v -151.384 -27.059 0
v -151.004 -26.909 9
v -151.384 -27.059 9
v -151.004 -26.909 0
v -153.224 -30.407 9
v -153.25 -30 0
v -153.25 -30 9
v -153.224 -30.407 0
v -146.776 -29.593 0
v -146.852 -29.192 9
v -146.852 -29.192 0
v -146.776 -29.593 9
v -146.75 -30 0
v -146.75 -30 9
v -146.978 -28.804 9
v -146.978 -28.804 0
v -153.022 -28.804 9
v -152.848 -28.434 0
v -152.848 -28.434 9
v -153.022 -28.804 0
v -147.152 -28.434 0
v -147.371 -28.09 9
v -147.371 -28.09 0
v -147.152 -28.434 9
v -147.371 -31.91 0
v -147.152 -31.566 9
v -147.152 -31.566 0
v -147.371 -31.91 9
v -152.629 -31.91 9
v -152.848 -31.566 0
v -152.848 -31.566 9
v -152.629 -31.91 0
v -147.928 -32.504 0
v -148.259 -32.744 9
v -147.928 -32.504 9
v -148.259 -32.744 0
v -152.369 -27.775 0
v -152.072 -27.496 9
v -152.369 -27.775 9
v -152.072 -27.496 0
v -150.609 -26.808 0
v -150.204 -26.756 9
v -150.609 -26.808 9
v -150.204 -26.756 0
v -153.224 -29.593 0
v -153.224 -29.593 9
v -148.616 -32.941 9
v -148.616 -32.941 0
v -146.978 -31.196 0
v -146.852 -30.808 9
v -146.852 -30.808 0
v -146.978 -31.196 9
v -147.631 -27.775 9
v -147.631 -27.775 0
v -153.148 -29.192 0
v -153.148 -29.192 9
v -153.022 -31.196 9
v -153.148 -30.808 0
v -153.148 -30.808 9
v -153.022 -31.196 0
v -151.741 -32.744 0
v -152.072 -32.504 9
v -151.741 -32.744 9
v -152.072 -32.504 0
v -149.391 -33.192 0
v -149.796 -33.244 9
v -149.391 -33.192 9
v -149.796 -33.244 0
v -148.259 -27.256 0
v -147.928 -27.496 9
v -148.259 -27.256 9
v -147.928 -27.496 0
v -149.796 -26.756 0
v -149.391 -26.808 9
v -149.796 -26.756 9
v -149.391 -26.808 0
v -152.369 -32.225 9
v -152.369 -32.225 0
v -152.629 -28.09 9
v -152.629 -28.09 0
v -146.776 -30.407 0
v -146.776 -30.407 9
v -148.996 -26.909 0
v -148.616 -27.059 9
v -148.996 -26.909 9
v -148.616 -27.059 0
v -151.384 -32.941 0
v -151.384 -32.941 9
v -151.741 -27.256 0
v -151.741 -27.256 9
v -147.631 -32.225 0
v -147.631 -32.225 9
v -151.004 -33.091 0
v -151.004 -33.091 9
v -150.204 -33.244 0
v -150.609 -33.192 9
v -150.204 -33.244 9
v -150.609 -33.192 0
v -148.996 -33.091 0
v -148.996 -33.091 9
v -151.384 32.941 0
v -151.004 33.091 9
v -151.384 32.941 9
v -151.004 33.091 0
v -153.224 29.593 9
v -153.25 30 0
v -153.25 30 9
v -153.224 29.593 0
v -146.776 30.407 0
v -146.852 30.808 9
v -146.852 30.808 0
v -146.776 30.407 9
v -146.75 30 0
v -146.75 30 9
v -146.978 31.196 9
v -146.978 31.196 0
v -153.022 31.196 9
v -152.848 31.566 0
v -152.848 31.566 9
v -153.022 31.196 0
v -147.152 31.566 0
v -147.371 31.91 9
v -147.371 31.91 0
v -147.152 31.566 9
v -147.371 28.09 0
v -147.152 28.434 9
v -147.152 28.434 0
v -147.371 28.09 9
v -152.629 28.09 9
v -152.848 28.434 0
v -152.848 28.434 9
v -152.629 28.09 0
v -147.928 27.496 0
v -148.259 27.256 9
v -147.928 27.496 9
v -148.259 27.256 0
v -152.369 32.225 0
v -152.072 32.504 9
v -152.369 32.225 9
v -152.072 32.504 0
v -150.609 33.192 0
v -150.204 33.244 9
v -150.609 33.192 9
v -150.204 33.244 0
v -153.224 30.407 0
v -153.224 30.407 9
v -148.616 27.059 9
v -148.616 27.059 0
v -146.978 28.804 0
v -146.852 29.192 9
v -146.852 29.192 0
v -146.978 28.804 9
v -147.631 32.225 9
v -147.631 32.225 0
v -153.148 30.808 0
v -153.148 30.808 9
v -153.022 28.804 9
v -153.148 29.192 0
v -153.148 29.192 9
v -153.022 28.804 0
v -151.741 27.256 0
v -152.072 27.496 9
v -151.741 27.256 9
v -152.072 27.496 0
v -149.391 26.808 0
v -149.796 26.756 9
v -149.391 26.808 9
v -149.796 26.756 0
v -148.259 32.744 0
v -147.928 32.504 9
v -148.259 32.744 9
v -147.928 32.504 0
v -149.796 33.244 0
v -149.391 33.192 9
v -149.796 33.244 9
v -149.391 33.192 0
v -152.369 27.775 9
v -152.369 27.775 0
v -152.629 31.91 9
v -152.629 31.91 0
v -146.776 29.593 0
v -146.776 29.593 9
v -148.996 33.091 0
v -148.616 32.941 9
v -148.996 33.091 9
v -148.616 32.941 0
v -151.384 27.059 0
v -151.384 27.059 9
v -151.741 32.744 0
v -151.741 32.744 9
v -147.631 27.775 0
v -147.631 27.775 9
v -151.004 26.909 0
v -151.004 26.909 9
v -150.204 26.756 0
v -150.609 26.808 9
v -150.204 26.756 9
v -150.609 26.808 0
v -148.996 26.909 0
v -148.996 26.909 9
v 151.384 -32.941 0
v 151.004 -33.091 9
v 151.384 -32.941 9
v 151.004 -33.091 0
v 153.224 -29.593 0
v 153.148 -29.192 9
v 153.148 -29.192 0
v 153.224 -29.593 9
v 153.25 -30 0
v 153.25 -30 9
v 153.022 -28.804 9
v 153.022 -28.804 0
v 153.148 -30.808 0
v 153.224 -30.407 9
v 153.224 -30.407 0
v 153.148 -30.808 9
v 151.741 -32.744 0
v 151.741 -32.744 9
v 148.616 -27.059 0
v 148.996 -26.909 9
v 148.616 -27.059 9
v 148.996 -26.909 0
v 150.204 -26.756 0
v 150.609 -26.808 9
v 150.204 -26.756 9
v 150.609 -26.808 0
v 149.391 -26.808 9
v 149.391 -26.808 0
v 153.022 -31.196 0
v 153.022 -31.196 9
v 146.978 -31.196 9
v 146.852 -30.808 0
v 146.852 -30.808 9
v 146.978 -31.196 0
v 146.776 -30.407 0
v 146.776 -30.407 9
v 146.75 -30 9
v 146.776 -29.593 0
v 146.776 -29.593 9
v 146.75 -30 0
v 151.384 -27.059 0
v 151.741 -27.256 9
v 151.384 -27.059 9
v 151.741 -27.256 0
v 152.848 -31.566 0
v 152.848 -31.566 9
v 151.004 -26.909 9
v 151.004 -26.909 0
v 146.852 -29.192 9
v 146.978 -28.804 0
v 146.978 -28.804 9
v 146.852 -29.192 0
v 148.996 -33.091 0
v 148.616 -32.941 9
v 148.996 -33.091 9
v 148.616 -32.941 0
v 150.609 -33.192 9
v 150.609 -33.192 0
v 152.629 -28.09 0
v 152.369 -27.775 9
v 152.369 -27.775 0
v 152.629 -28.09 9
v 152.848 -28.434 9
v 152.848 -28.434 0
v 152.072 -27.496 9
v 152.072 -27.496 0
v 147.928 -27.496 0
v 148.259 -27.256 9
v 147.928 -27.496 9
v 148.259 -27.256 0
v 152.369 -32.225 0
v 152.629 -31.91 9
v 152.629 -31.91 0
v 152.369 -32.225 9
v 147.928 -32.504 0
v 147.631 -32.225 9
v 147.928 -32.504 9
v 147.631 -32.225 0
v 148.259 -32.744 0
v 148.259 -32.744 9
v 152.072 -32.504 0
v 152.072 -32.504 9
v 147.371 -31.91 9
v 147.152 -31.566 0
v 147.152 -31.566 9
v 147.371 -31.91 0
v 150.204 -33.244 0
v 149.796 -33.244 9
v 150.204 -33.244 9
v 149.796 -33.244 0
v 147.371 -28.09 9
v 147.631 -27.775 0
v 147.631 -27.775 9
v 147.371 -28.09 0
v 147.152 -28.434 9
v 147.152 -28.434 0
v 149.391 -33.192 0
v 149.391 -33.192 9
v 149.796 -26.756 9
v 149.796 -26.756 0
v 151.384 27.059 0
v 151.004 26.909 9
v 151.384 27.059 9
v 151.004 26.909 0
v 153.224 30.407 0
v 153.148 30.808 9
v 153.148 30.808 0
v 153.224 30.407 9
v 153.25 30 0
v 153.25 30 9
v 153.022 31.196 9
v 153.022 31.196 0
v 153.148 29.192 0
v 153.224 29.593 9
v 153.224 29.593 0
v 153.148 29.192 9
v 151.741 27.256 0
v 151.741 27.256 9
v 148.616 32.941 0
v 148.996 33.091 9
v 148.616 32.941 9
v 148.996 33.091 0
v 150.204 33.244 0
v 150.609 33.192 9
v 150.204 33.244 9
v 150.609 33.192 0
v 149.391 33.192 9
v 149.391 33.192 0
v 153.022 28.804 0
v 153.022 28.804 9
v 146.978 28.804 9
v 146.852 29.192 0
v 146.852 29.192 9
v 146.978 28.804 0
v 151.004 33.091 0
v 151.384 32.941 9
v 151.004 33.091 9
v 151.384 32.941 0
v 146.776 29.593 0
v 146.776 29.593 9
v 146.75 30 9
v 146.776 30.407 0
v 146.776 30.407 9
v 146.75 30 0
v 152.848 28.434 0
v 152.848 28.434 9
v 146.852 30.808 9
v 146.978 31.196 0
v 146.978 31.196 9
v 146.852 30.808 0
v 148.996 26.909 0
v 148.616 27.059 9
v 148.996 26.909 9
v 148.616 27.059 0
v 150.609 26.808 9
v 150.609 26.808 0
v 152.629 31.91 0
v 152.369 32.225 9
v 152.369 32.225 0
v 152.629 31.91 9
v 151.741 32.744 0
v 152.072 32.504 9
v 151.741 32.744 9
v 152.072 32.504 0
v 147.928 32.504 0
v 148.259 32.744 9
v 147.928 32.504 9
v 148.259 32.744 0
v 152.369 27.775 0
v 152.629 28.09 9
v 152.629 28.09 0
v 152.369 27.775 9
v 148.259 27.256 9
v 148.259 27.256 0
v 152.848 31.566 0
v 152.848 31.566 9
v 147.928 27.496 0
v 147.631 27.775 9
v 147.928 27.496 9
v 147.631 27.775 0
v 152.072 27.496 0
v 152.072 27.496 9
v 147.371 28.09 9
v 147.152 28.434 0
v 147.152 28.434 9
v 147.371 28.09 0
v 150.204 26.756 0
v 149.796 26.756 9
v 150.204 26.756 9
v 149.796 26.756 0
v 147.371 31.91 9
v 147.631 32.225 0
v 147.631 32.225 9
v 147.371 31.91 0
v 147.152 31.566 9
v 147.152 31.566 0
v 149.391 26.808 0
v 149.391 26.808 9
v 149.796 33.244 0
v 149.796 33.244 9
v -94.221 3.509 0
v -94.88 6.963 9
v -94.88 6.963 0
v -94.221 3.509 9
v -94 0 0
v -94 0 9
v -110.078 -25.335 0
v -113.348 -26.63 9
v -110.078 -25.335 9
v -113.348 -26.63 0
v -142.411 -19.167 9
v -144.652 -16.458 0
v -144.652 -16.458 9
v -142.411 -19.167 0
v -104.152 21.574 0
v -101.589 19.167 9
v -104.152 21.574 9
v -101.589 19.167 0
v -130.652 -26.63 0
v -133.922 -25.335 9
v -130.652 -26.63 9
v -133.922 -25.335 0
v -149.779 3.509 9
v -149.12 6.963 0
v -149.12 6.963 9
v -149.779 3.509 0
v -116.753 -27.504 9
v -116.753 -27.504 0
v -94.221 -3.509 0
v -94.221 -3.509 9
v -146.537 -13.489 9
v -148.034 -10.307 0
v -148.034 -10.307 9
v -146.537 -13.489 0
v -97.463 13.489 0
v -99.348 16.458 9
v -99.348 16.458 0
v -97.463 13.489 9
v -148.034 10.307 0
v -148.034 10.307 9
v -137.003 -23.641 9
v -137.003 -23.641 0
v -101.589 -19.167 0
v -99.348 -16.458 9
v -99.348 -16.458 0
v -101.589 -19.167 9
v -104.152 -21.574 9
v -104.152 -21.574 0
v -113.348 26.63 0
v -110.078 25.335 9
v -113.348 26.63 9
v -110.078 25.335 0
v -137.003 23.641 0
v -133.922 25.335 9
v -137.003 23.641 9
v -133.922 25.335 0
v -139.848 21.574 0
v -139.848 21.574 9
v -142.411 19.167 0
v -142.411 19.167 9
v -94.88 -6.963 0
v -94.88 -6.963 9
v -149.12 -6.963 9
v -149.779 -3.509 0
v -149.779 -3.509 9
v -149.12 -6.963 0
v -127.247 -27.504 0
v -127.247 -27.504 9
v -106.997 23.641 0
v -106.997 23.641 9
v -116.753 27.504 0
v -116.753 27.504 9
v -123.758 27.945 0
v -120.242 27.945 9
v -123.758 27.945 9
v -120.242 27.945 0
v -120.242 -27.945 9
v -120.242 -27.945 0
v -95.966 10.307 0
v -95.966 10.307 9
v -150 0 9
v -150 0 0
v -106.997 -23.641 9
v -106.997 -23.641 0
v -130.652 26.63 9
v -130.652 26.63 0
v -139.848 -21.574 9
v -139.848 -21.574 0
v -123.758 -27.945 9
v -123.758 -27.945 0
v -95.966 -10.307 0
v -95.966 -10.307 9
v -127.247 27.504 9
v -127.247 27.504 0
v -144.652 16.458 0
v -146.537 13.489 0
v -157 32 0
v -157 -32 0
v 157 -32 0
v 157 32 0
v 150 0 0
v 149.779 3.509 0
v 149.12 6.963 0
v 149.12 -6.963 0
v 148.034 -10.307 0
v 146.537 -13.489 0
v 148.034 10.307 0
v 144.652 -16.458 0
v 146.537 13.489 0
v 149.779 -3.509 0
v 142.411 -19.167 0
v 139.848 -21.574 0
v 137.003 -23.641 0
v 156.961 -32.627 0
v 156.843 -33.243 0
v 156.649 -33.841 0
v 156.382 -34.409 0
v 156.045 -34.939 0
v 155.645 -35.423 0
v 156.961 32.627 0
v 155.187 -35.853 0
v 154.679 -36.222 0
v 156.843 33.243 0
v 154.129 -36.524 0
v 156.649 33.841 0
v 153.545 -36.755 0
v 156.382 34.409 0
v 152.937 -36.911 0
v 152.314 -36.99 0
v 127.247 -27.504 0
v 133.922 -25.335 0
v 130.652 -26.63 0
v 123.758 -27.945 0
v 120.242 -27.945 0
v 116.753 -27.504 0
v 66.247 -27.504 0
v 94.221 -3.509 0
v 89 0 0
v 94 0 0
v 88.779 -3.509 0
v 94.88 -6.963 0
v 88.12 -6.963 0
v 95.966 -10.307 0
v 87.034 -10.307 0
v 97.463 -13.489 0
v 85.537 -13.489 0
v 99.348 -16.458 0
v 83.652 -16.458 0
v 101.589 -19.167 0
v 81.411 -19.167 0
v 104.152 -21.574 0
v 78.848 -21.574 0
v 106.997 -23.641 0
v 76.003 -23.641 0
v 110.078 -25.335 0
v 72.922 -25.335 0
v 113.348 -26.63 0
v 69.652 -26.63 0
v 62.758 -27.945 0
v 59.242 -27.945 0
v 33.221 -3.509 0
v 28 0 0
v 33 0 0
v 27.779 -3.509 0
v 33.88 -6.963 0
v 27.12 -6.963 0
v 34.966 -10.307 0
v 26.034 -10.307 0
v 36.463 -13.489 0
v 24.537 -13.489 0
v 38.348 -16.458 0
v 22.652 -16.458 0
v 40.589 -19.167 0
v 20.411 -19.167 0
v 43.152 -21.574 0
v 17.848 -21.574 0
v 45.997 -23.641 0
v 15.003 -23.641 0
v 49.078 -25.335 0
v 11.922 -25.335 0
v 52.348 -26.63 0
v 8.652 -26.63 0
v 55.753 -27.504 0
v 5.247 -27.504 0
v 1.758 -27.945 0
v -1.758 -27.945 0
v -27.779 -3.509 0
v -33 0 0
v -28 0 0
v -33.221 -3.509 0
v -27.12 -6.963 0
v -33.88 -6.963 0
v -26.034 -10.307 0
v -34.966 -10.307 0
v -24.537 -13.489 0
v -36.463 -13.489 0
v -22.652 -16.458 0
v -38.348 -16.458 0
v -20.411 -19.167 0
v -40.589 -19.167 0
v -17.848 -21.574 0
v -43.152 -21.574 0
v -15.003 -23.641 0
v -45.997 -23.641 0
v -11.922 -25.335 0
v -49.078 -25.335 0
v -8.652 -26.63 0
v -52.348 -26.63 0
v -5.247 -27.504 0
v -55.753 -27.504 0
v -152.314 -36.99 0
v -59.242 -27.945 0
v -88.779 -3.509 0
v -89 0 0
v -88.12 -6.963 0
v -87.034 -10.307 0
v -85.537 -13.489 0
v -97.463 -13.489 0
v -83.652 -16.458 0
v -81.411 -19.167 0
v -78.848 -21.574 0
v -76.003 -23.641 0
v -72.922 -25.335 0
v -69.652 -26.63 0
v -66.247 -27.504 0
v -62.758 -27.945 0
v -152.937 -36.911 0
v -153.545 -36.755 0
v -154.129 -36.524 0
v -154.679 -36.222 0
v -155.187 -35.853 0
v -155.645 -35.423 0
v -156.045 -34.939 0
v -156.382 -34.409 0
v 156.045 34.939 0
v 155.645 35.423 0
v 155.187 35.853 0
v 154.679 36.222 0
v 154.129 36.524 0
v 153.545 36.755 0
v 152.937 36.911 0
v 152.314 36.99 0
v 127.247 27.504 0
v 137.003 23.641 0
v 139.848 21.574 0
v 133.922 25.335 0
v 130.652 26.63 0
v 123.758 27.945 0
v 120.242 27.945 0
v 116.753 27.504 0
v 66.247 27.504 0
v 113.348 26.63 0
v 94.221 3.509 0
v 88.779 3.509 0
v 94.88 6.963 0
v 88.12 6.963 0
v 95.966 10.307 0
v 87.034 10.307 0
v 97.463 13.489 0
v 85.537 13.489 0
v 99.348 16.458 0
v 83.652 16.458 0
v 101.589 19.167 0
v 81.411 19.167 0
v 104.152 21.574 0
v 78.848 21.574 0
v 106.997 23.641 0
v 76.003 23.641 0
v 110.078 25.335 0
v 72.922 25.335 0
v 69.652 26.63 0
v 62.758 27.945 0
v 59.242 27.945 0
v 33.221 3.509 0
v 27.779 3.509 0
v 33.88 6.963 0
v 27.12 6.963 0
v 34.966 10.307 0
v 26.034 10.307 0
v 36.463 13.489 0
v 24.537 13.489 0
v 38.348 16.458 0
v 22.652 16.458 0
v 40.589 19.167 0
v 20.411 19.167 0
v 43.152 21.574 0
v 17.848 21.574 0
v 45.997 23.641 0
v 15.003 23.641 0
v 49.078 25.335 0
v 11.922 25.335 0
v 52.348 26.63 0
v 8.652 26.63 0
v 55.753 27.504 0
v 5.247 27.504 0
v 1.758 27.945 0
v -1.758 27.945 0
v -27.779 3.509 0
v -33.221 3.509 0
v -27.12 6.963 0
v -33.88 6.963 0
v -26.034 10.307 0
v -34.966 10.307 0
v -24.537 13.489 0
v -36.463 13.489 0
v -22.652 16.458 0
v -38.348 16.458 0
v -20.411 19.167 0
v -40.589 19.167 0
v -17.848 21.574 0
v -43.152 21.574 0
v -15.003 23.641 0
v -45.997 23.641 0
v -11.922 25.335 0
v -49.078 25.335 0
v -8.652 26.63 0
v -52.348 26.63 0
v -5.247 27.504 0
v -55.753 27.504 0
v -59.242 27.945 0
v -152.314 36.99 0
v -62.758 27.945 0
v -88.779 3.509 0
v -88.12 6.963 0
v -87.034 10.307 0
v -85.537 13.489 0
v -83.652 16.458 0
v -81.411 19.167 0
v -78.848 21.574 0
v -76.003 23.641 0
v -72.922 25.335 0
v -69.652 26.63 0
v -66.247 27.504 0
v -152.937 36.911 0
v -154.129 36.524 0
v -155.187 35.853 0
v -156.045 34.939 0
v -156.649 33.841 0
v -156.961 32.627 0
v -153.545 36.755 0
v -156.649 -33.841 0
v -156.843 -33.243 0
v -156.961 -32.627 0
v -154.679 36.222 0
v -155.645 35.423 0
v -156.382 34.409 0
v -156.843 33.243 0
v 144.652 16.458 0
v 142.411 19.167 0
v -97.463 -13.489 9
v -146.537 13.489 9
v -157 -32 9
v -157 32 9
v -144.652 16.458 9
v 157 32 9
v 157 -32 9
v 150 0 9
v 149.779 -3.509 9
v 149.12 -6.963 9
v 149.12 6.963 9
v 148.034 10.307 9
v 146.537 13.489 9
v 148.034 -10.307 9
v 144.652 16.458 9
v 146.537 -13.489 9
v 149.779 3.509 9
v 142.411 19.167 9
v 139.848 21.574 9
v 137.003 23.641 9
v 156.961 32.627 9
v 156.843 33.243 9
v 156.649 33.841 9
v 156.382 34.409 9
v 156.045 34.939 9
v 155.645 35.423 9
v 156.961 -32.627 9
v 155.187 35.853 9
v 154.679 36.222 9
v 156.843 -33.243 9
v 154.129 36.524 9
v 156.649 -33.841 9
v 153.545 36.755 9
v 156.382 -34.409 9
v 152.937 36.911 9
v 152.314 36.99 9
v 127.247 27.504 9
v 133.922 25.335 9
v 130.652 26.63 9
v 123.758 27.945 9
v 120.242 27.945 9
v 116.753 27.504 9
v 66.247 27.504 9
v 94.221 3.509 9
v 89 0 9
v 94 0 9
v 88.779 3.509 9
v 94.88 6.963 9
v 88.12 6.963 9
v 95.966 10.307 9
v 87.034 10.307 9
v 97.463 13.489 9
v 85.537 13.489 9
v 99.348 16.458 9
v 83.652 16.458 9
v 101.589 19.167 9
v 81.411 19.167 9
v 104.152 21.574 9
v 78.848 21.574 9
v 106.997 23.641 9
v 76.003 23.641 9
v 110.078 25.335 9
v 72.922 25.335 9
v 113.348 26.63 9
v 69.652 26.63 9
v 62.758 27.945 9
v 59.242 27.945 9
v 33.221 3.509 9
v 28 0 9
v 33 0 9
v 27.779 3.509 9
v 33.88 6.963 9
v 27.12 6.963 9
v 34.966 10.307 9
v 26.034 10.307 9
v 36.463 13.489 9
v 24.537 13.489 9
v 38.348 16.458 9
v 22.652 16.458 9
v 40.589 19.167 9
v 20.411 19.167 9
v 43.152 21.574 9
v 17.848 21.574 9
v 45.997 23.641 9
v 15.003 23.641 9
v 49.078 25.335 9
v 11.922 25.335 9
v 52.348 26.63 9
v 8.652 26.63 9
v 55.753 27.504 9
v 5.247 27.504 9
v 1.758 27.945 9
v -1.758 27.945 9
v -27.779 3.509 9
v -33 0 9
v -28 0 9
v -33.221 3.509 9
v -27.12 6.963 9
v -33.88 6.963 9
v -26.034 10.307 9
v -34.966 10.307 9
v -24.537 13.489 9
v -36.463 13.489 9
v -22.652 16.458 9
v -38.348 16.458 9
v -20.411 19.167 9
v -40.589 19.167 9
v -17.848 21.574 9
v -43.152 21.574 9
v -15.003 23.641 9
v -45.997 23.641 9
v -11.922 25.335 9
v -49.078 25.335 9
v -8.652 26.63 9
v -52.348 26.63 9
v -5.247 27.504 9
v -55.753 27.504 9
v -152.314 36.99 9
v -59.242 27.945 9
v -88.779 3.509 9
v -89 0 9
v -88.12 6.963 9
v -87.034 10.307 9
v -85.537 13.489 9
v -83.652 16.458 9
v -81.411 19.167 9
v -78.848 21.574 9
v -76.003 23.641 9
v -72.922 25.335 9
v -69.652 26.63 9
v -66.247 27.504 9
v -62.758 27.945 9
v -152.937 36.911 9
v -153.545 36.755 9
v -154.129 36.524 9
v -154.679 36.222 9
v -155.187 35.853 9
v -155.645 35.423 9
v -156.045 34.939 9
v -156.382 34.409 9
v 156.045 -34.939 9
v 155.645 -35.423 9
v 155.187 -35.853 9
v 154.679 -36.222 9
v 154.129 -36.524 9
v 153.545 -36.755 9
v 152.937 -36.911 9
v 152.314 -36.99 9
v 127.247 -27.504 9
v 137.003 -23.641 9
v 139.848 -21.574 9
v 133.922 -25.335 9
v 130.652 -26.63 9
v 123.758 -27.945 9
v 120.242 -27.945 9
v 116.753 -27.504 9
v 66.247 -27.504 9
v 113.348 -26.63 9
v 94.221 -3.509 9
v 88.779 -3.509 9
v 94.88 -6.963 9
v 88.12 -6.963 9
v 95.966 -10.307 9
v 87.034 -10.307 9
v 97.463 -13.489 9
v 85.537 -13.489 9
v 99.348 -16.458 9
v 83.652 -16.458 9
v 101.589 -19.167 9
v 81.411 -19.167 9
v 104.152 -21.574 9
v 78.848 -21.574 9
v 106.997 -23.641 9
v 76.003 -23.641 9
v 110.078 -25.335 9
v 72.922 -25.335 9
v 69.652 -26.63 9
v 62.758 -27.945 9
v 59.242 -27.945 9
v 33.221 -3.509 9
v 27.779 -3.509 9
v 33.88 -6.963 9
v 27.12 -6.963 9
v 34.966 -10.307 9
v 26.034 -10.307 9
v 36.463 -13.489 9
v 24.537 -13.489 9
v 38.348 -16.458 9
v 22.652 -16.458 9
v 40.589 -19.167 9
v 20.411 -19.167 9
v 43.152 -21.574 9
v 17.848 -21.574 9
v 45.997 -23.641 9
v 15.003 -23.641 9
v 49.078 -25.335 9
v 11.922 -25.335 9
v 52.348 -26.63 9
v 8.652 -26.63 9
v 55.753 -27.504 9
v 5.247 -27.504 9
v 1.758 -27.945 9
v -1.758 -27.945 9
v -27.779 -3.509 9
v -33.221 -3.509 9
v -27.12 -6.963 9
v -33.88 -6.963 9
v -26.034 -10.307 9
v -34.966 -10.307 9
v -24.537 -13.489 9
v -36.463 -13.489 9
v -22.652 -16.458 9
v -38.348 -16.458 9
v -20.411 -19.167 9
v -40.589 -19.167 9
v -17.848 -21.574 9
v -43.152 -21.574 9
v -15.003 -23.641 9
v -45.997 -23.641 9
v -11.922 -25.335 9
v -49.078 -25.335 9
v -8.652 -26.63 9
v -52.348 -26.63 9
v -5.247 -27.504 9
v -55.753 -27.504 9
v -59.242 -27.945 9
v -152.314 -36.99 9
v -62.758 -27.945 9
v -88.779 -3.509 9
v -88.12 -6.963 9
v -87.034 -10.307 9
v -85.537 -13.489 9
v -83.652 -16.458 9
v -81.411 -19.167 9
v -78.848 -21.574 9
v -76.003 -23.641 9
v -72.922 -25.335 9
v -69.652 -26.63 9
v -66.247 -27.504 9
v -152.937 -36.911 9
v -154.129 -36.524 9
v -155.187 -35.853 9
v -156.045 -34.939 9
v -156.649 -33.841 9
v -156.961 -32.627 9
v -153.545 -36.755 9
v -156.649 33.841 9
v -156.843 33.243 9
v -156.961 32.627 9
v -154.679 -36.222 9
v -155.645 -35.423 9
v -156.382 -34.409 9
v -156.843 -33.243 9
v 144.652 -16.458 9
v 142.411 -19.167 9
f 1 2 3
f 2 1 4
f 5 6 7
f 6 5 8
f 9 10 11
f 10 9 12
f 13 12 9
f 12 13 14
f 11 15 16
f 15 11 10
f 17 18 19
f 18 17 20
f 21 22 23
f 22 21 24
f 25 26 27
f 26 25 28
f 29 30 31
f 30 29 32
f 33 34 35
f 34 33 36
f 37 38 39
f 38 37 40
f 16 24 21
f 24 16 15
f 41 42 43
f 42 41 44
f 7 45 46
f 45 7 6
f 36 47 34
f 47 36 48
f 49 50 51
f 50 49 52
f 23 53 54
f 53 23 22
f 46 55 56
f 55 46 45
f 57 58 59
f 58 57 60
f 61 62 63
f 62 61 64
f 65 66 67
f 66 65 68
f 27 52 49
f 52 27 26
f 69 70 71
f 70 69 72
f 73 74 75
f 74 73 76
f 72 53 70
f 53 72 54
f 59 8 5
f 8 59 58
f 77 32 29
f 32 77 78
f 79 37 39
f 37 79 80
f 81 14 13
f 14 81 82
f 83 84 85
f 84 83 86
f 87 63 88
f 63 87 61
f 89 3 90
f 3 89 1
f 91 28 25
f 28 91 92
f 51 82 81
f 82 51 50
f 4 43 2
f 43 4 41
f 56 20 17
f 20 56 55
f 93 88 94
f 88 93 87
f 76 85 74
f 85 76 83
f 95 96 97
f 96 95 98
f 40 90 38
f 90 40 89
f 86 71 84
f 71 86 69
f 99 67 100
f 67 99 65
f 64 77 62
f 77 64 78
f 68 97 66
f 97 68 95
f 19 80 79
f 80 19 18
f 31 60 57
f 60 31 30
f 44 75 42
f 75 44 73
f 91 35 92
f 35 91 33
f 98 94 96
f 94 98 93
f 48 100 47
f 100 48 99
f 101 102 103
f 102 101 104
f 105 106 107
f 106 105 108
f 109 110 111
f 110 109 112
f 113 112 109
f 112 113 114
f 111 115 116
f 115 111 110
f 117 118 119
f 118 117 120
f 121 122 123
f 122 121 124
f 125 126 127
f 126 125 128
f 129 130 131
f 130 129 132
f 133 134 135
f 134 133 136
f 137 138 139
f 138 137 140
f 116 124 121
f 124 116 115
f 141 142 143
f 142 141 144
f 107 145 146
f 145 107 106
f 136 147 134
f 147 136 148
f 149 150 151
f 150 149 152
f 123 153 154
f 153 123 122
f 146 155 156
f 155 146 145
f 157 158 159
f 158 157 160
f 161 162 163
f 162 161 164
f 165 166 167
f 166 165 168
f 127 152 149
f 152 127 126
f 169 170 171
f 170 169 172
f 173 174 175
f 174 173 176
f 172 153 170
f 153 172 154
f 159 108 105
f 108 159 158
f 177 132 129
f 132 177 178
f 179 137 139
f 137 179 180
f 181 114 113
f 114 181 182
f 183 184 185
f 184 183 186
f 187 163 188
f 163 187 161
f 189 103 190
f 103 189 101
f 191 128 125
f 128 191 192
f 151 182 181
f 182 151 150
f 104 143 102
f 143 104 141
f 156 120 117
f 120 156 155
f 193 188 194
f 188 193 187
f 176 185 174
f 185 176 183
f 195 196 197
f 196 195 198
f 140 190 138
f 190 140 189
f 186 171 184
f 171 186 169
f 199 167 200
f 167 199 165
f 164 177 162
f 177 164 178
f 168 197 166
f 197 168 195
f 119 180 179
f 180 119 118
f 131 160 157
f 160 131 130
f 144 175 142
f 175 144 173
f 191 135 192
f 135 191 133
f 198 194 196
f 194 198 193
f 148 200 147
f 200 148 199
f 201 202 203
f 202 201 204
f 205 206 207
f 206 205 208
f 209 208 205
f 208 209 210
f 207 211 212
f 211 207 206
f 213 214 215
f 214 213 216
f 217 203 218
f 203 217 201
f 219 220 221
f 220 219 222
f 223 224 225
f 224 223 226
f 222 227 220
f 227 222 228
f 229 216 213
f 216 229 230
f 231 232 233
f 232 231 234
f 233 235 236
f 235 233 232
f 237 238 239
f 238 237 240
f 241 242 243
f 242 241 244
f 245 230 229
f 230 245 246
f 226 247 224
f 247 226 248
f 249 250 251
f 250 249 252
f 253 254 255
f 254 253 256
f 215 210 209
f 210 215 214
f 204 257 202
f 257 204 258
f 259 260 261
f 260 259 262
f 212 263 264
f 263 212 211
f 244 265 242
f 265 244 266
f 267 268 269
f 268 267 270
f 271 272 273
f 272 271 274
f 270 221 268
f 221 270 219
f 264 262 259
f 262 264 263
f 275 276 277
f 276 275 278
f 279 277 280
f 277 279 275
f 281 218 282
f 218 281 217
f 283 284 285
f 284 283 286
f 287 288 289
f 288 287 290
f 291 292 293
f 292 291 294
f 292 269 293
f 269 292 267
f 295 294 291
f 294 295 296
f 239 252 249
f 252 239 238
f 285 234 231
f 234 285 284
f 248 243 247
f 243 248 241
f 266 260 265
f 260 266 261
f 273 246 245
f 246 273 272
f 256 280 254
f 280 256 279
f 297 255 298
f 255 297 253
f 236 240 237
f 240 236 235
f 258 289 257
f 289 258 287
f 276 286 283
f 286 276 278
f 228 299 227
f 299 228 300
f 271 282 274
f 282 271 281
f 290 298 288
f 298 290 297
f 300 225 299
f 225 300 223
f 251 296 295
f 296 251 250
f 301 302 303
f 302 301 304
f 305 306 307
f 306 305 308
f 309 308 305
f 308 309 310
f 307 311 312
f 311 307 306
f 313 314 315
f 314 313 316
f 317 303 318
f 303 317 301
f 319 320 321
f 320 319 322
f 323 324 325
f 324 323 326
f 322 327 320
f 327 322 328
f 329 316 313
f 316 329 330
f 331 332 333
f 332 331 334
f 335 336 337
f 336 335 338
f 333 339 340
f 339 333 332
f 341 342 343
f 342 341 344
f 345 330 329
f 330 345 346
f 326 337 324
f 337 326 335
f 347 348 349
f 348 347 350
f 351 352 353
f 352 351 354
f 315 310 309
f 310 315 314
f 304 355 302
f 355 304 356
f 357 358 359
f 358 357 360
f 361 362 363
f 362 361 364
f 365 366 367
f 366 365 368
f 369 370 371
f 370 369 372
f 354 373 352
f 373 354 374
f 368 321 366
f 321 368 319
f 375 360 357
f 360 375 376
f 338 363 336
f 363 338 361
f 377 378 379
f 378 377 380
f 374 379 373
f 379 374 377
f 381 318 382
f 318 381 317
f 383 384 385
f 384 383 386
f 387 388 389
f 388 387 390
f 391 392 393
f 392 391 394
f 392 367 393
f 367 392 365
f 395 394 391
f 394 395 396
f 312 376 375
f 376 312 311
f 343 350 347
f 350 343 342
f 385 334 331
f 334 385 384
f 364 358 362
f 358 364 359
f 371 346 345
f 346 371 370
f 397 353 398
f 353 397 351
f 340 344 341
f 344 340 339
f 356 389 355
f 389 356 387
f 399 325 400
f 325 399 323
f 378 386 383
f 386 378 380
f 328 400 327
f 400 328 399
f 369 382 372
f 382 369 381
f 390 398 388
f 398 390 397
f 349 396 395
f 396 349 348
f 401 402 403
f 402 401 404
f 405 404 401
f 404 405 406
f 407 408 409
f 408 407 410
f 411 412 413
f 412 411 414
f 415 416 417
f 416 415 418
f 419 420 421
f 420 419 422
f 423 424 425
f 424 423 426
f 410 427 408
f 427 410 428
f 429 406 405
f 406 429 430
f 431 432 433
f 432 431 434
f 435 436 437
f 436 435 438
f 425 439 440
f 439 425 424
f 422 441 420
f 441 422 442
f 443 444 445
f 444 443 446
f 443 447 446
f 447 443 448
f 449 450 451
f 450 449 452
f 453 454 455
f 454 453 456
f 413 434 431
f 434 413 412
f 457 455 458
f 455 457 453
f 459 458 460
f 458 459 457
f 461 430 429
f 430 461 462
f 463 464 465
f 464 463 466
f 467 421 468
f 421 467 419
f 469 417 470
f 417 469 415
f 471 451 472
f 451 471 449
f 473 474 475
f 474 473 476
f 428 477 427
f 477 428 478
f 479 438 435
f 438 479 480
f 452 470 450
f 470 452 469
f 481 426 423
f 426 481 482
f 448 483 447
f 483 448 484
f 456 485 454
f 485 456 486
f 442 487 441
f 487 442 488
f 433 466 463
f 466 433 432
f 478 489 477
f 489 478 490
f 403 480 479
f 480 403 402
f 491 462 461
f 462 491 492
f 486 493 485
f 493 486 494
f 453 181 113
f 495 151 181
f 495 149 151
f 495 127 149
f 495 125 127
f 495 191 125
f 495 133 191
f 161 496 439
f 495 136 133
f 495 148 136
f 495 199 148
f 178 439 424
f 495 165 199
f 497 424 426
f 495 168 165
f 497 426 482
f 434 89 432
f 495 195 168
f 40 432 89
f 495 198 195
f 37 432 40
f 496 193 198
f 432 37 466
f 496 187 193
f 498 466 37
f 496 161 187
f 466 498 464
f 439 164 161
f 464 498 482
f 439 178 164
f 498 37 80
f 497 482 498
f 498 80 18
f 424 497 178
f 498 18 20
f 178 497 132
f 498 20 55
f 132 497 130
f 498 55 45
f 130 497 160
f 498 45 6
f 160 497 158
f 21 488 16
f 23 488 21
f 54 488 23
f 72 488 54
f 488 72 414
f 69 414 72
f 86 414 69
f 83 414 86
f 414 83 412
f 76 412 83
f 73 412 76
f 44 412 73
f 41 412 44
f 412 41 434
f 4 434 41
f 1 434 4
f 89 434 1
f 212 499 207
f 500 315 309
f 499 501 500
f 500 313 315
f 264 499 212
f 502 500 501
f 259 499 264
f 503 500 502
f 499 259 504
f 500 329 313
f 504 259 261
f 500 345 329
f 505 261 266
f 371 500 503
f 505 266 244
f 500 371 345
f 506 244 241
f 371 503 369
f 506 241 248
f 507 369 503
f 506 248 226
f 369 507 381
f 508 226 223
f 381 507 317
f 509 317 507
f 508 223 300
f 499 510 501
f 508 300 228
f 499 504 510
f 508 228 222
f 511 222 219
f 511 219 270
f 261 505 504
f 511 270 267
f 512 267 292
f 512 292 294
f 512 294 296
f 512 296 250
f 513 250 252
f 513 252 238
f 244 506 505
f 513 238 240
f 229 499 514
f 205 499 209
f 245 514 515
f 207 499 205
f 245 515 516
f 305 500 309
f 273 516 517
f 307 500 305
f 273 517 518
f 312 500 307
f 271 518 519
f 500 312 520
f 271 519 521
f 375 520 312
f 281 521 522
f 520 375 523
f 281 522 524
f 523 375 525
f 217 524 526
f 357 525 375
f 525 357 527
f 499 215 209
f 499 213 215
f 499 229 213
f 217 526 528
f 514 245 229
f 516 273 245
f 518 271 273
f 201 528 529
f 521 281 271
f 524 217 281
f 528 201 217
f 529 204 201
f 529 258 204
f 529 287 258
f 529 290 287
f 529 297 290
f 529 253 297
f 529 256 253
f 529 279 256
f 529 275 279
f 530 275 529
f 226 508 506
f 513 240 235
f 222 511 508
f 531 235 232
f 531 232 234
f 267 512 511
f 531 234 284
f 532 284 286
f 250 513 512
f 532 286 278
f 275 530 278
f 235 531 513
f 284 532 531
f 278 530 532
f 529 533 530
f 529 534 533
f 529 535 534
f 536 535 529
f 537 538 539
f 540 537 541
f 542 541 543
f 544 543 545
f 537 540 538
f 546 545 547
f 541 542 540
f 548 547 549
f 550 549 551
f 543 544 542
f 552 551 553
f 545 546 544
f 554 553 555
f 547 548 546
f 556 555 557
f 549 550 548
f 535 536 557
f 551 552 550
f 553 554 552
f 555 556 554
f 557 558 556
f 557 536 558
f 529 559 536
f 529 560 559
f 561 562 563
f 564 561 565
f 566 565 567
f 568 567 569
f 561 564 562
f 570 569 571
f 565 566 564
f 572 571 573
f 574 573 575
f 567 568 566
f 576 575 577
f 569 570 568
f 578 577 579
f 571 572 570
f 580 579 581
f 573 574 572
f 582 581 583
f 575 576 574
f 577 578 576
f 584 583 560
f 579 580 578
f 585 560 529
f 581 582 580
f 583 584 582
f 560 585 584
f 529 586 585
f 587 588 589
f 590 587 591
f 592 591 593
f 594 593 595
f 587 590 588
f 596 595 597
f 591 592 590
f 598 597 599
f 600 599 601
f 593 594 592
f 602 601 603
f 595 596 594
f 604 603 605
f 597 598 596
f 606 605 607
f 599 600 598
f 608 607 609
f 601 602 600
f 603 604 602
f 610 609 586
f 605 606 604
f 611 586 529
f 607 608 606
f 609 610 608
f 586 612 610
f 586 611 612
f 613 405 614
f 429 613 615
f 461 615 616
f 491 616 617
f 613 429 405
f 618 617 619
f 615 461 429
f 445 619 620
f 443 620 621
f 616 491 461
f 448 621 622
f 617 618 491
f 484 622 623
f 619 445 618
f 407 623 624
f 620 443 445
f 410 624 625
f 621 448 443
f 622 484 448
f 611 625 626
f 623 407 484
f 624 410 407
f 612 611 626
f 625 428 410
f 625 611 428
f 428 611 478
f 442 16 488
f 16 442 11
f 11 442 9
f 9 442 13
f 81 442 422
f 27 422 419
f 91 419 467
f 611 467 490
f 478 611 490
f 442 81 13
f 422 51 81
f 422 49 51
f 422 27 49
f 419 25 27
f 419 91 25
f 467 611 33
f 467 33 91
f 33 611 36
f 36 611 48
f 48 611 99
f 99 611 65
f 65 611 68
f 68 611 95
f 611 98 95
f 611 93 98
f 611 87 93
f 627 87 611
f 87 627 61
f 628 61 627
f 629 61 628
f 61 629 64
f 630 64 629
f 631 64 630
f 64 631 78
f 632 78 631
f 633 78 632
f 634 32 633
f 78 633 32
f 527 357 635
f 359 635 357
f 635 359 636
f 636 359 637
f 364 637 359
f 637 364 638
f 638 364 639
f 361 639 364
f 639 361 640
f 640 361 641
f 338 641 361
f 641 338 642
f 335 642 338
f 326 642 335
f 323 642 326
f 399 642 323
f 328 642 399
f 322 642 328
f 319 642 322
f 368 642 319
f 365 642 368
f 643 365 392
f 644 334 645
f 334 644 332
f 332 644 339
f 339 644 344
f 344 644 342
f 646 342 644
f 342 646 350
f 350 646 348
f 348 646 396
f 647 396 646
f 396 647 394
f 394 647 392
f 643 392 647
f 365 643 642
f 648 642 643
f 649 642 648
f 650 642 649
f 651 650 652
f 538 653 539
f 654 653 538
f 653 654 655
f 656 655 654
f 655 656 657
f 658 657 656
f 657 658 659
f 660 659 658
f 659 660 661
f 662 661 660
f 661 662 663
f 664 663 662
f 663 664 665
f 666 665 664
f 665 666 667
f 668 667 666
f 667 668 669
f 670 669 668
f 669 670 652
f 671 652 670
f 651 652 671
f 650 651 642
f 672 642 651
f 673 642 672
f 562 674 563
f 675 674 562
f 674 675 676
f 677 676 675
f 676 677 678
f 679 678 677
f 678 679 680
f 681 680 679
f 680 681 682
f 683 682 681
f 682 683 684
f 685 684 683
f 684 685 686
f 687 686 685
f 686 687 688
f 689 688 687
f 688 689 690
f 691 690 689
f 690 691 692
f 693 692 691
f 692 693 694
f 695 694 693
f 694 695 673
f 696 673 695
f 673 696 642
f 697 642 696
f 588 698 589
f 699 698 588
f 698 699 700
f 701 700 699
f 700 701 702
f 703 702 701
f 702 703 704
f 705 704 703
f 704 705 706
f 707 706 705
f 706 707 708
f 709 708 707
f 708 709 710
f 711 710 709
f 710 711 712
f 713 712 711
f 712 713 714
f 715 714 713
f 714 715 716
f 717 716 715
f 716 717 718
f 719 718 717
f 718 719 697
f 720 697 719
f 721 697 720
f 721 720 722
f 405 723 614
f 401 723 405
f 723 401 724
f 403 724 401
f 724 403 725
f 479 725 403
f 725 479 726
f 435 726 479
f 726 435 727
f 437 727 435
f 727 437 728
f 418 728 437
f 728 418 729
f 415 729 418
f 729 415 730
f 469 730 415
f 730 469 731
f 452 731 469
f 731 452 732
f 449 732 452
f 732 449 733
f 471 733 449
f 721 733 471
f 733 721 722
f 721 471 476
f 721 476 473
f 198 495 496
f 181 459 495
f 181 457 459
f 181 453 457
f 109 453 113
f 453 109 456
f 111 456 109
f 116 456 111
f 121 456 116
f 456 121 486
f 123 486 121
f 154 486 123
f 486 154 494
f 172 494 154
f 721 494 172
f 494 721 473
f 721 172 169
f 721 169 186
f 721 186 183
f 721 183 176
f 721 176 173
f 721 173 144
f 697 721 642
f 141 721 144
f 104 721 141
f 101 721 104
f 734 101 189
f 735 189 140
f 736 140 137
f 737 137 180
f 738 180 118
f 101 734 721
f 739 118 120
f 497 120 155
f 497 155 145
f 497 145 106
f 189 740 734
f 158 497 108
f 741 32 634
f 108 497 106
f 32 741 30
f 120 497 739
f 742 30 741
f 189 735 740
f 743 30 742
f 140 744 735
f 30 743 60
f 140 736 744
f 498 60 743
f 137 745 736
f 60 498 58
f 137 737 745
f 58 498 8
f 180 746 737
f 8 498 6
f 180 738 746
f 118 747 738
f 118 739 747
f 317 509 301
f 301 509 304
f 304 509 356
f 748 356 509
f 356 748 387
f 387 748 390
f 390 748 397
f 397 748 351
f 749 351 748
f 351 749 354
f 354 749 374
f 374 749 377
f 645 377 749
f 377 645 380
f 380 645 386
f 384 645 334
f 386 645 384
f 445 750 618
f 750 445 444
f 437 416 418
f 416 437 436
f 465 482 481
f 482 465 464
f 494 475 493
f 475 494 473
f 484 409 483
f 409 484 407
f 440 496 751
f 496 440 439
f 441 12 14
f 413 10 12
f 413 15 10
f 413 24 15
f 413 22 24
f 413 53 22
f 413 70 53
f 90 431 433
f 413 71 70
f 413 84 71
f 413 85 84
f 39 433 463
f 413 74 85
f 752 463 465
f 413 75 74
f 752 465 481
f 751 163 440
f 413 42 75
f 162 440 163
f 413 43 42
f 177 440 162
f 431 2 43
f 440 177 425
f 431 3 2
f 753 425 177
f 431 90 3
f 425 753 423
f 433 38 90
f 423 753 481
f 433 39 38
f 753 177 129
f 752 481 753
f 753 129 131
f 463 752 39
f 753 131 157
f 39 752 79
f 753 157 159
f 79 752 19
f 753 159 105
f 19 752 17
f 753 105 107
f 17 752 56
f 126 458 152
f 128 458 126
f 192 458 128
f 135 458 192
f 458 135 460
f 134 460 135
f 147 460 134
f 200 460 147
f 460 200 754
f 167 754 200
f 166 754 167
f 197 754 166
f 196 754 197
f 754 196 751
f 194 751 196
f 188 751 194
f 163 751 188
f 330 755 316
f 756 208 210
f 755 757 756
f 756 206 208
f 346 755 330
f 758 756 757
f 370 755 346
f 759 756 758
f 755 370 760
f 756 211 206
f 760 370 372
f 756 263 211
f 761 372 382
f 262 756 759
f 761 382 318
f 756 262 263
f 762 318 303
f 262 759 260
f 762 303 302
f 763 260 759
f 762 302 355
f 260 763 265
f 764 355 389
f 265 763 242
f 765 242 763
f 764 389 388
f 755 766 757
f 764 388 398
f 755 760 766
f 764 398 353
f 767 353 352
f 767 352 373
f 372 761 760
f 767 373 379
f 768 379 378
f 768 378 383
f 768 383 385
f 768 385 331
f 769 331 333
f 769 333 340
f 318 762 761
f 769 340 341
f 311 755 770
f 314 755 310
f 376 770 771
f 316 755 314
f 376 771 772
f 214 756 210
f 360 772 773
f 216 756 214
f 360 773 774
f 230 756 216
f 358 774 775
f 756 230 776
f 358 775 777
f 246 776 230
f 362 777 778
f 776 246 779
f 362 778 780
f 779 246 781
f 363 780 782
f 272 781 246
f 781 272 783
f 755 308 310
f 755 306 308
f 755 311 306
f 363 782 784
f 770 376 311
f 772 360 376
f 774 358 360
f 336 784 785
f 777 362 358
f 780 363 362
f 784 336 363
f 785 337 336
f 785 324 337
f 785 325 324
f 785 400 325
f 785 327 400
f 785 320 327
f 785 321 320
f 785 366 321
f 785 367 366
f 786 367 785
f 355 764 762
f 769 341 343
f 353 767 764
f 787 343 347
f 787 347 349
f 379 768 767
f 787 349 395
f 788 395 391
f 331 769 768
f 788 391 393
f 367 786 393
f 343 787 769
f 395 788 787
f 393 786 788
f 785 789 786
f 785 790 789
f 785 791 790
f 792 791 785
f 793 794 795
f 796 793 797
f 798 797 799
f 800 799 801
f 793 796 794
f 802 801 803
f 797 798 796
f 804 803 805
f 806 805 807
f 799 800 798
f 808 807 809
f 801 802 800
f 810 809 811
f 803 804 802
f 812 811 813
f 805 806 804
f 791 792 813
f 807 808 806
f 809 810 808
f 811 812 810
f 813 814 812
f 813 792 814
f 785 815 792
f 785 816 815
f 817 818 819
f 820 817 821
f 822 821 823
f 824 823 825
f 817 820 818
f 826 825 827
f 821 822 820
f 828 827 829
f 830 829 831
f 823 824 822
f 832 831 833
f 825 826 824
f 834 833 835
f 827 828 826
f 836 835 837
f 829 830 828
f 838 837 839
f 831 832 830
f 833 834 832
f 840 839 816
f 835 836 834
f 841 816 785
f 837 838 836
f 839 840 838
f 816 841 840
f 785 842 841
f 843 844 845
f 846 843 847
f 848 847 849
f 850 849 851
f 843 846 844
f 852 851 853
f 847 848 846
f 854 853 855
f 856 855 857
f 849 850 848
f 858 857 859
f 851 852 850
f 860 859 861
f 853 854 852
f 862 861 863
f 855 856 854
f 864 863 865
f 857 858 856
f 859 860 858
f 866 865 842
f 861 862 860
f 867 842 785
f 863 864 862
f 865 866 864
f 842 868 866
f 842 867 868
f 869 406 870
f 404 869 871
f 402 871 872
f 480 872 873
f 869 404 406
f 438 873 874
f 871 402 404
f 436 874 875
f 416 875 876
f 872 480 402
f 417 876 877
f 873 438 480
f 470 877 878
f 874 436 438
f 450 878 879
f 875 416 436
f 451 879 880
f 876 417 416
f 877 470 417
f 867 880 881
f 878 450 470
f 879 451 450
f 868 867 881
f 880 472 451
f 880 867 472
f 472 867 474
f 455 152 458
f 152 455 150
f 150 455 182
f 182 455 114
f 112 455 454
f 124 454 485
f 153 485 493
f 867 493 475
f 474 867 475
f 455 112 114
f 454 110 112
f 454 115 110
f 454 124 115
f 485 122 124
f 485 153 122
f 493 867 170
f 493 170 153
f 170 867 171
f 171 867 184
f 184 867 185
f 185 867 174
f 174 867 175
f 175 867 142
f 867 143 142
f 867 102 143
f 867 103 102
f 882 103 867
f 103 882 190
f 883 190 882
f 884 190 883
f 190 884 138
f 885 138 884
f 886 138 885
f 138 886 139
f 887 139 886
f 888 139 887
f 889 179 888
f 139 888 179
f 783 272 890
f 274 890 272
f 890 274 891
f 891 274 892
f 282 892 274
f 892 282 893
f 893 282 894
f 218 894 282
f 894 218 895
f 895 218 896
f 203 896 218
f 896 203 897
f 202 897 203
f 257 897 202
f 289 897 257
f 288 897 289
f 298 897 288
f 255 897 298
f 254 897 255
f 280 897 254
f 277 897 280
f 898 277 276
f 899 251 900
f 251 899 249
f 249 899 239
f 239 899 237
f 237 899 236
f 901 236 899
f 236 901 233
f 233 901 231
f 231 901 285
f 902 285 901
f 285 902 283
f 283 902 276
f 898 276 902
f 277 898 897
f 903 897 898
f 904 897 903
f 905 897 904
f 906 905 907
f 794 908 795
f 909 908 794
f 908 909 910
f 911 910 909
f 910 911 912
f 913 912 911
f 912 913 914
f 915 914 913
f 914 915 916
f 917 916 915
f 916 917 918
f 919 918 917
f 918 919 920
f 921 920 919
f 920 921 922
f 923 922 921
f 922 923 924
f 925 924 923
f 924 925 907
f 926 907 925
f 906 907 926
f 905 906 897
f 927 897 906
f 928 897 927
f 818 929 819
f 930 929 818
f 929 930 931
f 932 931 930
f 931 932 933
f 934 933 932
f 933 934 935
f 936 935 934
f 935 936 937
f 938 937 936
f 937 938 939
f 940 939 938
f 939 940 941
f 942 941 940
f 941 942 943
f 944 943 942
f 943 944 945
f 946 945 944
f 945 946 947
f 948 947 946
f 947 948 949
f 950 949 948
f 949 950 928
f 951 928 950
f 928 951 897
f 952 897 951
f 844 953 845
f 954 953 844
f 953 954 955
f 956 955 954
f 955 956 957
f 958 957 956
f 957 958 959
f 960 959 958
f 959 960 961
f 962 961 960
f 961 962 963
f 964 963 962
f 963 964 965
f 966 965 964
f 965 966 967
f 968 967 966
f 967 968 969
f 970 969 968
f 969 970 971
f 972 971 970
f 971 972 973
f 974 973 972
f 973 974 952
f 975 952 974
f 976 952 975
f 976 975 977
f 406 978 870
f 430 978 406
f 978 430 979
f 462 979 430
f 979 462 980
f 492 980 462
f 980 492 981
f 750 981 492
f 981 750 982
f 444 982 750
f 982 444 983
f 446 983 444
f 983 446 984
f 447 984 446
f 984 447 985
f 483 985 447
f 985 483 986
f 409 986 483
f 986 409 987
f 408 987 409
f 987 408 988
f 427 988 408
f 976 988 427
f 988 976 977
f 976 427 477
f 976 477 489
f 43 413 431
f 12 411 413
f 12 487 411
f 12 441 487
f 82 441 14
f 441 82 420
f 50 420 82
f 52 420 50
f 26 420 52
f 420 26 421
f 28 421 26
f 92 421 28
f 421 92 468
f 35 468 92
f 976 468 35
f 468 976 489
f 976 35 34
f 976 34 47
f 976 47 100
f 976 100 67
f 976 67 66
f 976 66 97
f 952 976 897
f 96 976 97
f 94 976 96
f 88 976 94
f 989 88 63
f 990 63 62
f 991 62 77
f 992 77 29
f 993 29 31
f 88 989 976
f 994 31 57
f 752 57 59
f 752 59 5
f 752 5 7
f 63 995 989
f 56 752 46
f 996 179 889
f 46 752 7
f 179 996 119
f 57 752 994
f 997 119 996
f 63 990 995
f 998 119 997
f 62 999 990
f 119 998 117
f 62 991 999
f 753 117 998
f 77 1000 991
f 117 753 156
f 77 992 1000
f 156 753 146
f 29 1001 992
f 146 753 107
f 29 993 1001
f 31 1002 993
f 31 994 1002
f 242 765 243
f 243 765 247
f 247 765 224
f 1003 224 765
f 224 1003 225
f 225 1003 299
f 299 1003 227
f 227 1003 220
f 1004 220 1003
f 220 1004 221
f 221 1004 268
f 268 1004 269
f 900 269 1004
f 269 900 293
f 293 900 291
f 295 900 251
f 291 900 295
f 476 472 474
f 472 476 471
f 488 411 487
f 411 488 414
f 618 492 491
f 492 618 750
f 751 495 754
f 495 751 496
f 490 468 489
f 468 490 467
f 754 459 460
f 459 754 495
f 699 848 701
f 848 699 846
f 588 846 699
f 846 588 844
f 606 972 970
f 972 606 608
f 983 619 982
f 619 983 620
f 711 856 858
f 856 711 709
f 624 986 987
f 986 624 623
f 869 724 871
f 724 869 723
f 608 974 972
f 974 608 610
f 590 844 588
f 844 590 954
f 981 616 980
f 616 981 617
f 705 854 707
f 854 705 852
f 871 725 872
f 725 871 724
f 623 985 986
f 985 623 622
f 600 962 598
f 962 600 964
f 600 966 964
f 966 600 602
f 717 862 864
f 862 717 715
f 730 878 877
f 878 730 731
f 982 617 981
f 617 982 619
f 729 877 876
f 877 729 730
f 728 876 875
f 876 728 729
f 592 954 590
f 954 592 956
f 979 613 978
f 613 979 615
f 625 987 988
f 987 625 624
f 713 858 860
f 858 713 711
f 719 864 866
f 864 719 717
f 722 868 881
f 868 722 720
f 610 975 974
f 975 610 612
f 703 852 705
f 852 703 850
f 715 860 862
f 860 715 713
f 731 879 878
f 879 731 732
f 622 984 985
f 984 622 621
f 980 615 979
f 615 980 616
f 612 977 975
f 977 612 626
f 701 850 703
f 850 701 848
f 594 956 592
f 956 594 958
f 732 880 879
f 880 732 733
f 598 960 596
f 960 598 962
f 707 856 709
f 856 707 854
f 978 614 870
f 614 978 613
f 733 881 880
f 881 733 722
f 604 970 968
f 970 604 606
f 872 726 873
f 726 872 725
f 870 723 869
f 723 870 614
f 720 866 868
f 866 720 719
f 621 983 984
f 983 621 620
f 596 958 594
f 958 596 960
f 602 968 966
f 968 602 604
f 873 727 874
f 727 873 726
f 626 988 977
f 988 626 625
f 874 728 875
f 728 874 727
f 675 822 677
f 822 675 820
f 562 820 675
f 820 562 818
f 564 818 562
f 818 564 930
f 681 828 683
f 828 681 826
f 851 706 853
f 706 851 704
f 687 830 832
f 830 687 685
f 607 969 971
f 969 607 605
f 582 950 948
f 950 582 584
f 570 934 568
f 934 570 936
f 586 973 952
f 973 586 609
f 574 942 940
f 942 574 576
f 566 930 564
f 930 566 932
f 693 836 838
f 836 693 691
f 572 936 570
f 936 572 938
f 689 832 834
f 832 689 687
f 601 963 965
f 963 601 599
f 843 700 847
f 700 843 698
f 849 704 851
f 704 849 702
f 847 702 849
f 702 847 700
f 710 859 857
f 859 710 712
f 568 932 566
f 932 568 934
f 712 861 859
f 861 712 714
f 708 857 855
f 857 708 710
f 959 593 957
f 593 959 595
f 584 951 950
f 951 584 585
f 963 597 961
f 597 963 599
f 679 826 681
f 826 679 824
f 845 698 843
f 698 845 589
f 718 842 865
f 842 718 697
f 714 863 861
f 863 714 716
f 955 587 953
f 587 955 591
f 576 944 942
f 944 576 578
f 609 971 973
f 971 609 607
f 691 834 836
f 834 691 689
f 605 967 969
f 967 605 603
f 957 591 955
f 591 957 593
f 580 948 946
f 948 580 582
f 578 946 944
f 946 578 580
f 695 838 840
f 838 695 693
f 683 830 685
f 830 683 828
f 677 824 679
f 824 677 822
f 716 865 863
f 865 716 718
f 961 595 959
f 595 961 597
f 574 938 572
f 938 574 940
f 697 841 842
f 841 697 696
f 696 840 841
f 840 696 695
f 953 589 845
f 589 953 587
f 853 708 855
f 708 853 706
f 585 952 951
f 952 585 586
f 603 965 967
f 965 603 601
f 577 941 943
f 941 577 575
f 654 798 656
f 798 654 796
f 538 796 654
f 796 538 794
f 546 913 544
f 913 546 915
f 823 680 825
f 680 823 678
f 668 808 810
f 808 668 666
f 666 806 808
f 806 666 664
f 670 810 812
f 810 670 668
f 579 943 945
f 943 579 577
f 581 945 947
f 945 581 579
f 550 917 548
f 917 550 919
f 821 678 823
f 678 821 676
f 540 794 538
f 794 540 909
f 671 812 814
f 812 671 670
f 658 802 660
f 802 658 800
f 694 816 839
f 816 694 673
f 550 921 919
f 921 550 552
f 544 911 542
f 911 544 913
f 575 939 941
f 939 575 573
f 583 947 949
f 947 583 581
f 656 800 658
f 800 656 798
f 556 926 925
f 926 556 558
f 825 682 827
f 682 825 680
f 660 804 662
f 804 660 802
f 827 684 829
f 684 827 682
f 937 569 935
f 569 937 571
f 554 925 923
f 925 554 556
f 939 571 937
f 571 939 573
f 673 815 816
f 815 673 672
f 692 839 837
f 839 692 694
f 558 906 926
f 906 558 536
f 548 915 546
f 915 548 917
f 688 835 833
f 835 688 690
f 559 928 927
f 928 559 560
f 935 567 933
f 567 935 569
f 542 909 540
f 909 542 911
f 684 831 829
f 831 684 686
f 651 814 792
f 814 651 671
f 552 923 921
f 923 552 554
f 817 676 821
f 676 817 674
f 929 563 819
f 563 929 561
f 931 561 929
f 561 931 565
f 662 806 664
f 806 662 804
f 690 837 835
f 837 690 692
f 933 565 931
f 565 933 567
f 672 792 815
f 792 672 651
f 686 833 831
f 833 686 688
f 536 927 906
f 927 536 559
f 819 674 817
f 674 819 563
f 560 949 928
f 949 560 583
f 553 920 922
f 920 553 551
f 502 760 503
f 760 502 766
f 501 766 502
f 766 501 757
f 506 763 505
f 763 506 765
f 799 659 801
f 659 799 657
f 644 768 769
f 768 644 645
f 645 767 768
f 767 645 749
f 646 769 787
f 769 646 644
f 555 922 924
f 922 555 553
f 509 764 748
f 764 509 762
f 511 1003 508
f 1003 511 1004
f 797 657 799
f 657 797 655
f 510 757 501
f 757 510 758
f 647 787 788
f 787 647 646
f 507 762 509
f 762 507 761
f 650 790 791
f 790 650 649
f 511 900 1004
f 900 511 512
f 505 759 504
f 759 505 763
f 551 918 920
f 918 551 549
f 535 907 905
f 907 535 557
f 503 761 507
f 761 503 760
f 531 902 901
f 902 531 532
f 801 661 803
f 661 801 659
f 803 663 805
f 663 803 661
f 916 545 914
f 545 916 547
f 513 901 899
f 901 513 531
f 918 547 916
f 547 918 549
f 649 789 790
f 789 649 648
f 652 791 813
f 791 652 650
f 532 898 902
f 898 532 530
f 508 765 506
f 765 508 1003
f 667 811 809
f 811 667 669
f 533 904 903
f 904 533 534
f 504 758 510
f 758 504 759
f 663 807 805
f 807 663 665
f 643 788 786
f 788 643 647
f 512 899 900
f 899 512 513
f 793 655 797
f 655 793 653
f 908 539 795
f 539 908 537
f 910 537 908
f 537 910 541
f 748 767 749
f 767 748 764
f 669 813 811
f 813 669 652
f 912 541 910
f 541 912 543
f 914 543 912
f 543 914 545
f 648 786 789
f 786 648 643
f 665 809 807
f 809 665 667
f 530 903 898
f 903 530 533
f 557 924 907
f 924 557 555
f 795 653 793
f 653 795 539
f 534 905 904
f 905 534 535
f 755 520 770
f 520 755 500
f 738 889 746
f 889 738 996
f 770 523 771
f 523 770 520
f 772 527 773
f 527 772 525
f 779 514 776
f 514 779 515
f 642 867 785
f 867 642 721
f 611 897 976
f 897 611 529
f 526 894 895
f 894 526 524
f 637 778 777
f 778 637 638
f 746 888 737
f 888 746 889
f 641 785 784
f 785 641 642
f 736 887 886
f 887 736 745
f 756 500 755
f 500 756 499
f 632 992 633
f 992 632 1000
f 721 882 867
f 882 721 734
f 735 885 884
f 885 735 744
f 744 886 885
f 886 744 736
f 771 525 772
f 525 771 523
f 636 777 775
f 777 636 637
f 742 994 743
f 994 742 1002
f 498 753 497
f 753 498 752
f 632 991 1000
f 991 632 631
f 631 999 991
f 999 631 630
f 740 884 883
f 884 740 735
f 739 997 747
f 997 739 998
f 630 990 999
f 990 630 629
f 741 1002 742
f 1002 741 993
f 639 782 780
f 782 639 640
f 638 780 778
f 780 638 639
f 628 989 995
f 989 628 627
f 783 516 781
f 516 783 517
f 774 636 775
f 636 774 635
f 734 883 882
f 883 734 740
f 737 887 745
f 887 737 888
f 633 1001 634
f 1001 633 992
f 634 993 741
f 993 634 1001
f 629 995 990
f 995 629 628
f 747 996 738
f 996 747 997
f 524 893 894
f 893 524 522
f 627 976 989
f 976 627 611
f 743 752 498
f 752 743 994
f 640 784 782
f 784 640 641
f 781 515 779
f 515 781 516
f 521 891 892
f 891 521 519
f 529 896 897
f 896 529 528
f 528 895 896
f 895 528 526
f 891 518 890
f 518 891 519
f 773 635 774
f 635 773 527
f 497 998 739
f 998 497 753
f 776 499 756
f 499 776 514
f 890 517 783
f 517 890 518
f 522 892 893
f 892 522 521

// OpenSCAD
$fn = 50;


difference() {
	union() {
		hull() {
			translate(v = [-152.0000000000, 32.0000000000, 0]) {
				cylinder(h = 9, r = 5);
			}
			translate(v = [152.0000000000, 32.0000000000, 0]) {
				cylinder(h = 9, r = 5);
			}
			translate(v = [-152.0000000000, -32.0000000000, 0]) {
				cylinder(h = 9, r = 5);
			}
			translate(v = [152.0000000000, -32.0000000000, 0]) {
				cylinder(h = 9, r = 5);
			}
		}
	}
	union() {
		#translate(v = [-150.0000000000, -30.0000000000, -100.0000000000]) {
			cylinder(h = 200, r = 3.2500000000);
		}
		#translate(v = [-150.0000000000, 30.0000000000, -100.0000000000]) {
			cylinder(h = 200, r = 3.2500000000);
		}
		#translate(v = [150.0000000000, -30.0000000000, -100.0000000000]) {
			cylinder(h = 200, r = 3.2500000000);
		}
		#translate(v = [150.0000000000, 30.0000000000, -100.0000000000]) {
			cylinder(h = 200, r = 3.2500000000);
		}
		#translate(v = [-122.0000000000, 0, 0]) {
			cylinder(h = 9, r = 28.0000000000);
		}
		#translate(v = [-61.0000000000, 0, 0]) {
			cylinder(h = 9, r = 28.0000000000);
		}
		#cylinder(h = 9, r = 28.0000000000);
		#translate(v = [61.0000000000, 0, 0]) {
			cylinder(h = 9, r = 28.0000000000);
		}
		#translate(v = [122.0000000000, 0, 0]) {
			cylinder(h = 9, r = 28.0000000000);
		}
	}
}
